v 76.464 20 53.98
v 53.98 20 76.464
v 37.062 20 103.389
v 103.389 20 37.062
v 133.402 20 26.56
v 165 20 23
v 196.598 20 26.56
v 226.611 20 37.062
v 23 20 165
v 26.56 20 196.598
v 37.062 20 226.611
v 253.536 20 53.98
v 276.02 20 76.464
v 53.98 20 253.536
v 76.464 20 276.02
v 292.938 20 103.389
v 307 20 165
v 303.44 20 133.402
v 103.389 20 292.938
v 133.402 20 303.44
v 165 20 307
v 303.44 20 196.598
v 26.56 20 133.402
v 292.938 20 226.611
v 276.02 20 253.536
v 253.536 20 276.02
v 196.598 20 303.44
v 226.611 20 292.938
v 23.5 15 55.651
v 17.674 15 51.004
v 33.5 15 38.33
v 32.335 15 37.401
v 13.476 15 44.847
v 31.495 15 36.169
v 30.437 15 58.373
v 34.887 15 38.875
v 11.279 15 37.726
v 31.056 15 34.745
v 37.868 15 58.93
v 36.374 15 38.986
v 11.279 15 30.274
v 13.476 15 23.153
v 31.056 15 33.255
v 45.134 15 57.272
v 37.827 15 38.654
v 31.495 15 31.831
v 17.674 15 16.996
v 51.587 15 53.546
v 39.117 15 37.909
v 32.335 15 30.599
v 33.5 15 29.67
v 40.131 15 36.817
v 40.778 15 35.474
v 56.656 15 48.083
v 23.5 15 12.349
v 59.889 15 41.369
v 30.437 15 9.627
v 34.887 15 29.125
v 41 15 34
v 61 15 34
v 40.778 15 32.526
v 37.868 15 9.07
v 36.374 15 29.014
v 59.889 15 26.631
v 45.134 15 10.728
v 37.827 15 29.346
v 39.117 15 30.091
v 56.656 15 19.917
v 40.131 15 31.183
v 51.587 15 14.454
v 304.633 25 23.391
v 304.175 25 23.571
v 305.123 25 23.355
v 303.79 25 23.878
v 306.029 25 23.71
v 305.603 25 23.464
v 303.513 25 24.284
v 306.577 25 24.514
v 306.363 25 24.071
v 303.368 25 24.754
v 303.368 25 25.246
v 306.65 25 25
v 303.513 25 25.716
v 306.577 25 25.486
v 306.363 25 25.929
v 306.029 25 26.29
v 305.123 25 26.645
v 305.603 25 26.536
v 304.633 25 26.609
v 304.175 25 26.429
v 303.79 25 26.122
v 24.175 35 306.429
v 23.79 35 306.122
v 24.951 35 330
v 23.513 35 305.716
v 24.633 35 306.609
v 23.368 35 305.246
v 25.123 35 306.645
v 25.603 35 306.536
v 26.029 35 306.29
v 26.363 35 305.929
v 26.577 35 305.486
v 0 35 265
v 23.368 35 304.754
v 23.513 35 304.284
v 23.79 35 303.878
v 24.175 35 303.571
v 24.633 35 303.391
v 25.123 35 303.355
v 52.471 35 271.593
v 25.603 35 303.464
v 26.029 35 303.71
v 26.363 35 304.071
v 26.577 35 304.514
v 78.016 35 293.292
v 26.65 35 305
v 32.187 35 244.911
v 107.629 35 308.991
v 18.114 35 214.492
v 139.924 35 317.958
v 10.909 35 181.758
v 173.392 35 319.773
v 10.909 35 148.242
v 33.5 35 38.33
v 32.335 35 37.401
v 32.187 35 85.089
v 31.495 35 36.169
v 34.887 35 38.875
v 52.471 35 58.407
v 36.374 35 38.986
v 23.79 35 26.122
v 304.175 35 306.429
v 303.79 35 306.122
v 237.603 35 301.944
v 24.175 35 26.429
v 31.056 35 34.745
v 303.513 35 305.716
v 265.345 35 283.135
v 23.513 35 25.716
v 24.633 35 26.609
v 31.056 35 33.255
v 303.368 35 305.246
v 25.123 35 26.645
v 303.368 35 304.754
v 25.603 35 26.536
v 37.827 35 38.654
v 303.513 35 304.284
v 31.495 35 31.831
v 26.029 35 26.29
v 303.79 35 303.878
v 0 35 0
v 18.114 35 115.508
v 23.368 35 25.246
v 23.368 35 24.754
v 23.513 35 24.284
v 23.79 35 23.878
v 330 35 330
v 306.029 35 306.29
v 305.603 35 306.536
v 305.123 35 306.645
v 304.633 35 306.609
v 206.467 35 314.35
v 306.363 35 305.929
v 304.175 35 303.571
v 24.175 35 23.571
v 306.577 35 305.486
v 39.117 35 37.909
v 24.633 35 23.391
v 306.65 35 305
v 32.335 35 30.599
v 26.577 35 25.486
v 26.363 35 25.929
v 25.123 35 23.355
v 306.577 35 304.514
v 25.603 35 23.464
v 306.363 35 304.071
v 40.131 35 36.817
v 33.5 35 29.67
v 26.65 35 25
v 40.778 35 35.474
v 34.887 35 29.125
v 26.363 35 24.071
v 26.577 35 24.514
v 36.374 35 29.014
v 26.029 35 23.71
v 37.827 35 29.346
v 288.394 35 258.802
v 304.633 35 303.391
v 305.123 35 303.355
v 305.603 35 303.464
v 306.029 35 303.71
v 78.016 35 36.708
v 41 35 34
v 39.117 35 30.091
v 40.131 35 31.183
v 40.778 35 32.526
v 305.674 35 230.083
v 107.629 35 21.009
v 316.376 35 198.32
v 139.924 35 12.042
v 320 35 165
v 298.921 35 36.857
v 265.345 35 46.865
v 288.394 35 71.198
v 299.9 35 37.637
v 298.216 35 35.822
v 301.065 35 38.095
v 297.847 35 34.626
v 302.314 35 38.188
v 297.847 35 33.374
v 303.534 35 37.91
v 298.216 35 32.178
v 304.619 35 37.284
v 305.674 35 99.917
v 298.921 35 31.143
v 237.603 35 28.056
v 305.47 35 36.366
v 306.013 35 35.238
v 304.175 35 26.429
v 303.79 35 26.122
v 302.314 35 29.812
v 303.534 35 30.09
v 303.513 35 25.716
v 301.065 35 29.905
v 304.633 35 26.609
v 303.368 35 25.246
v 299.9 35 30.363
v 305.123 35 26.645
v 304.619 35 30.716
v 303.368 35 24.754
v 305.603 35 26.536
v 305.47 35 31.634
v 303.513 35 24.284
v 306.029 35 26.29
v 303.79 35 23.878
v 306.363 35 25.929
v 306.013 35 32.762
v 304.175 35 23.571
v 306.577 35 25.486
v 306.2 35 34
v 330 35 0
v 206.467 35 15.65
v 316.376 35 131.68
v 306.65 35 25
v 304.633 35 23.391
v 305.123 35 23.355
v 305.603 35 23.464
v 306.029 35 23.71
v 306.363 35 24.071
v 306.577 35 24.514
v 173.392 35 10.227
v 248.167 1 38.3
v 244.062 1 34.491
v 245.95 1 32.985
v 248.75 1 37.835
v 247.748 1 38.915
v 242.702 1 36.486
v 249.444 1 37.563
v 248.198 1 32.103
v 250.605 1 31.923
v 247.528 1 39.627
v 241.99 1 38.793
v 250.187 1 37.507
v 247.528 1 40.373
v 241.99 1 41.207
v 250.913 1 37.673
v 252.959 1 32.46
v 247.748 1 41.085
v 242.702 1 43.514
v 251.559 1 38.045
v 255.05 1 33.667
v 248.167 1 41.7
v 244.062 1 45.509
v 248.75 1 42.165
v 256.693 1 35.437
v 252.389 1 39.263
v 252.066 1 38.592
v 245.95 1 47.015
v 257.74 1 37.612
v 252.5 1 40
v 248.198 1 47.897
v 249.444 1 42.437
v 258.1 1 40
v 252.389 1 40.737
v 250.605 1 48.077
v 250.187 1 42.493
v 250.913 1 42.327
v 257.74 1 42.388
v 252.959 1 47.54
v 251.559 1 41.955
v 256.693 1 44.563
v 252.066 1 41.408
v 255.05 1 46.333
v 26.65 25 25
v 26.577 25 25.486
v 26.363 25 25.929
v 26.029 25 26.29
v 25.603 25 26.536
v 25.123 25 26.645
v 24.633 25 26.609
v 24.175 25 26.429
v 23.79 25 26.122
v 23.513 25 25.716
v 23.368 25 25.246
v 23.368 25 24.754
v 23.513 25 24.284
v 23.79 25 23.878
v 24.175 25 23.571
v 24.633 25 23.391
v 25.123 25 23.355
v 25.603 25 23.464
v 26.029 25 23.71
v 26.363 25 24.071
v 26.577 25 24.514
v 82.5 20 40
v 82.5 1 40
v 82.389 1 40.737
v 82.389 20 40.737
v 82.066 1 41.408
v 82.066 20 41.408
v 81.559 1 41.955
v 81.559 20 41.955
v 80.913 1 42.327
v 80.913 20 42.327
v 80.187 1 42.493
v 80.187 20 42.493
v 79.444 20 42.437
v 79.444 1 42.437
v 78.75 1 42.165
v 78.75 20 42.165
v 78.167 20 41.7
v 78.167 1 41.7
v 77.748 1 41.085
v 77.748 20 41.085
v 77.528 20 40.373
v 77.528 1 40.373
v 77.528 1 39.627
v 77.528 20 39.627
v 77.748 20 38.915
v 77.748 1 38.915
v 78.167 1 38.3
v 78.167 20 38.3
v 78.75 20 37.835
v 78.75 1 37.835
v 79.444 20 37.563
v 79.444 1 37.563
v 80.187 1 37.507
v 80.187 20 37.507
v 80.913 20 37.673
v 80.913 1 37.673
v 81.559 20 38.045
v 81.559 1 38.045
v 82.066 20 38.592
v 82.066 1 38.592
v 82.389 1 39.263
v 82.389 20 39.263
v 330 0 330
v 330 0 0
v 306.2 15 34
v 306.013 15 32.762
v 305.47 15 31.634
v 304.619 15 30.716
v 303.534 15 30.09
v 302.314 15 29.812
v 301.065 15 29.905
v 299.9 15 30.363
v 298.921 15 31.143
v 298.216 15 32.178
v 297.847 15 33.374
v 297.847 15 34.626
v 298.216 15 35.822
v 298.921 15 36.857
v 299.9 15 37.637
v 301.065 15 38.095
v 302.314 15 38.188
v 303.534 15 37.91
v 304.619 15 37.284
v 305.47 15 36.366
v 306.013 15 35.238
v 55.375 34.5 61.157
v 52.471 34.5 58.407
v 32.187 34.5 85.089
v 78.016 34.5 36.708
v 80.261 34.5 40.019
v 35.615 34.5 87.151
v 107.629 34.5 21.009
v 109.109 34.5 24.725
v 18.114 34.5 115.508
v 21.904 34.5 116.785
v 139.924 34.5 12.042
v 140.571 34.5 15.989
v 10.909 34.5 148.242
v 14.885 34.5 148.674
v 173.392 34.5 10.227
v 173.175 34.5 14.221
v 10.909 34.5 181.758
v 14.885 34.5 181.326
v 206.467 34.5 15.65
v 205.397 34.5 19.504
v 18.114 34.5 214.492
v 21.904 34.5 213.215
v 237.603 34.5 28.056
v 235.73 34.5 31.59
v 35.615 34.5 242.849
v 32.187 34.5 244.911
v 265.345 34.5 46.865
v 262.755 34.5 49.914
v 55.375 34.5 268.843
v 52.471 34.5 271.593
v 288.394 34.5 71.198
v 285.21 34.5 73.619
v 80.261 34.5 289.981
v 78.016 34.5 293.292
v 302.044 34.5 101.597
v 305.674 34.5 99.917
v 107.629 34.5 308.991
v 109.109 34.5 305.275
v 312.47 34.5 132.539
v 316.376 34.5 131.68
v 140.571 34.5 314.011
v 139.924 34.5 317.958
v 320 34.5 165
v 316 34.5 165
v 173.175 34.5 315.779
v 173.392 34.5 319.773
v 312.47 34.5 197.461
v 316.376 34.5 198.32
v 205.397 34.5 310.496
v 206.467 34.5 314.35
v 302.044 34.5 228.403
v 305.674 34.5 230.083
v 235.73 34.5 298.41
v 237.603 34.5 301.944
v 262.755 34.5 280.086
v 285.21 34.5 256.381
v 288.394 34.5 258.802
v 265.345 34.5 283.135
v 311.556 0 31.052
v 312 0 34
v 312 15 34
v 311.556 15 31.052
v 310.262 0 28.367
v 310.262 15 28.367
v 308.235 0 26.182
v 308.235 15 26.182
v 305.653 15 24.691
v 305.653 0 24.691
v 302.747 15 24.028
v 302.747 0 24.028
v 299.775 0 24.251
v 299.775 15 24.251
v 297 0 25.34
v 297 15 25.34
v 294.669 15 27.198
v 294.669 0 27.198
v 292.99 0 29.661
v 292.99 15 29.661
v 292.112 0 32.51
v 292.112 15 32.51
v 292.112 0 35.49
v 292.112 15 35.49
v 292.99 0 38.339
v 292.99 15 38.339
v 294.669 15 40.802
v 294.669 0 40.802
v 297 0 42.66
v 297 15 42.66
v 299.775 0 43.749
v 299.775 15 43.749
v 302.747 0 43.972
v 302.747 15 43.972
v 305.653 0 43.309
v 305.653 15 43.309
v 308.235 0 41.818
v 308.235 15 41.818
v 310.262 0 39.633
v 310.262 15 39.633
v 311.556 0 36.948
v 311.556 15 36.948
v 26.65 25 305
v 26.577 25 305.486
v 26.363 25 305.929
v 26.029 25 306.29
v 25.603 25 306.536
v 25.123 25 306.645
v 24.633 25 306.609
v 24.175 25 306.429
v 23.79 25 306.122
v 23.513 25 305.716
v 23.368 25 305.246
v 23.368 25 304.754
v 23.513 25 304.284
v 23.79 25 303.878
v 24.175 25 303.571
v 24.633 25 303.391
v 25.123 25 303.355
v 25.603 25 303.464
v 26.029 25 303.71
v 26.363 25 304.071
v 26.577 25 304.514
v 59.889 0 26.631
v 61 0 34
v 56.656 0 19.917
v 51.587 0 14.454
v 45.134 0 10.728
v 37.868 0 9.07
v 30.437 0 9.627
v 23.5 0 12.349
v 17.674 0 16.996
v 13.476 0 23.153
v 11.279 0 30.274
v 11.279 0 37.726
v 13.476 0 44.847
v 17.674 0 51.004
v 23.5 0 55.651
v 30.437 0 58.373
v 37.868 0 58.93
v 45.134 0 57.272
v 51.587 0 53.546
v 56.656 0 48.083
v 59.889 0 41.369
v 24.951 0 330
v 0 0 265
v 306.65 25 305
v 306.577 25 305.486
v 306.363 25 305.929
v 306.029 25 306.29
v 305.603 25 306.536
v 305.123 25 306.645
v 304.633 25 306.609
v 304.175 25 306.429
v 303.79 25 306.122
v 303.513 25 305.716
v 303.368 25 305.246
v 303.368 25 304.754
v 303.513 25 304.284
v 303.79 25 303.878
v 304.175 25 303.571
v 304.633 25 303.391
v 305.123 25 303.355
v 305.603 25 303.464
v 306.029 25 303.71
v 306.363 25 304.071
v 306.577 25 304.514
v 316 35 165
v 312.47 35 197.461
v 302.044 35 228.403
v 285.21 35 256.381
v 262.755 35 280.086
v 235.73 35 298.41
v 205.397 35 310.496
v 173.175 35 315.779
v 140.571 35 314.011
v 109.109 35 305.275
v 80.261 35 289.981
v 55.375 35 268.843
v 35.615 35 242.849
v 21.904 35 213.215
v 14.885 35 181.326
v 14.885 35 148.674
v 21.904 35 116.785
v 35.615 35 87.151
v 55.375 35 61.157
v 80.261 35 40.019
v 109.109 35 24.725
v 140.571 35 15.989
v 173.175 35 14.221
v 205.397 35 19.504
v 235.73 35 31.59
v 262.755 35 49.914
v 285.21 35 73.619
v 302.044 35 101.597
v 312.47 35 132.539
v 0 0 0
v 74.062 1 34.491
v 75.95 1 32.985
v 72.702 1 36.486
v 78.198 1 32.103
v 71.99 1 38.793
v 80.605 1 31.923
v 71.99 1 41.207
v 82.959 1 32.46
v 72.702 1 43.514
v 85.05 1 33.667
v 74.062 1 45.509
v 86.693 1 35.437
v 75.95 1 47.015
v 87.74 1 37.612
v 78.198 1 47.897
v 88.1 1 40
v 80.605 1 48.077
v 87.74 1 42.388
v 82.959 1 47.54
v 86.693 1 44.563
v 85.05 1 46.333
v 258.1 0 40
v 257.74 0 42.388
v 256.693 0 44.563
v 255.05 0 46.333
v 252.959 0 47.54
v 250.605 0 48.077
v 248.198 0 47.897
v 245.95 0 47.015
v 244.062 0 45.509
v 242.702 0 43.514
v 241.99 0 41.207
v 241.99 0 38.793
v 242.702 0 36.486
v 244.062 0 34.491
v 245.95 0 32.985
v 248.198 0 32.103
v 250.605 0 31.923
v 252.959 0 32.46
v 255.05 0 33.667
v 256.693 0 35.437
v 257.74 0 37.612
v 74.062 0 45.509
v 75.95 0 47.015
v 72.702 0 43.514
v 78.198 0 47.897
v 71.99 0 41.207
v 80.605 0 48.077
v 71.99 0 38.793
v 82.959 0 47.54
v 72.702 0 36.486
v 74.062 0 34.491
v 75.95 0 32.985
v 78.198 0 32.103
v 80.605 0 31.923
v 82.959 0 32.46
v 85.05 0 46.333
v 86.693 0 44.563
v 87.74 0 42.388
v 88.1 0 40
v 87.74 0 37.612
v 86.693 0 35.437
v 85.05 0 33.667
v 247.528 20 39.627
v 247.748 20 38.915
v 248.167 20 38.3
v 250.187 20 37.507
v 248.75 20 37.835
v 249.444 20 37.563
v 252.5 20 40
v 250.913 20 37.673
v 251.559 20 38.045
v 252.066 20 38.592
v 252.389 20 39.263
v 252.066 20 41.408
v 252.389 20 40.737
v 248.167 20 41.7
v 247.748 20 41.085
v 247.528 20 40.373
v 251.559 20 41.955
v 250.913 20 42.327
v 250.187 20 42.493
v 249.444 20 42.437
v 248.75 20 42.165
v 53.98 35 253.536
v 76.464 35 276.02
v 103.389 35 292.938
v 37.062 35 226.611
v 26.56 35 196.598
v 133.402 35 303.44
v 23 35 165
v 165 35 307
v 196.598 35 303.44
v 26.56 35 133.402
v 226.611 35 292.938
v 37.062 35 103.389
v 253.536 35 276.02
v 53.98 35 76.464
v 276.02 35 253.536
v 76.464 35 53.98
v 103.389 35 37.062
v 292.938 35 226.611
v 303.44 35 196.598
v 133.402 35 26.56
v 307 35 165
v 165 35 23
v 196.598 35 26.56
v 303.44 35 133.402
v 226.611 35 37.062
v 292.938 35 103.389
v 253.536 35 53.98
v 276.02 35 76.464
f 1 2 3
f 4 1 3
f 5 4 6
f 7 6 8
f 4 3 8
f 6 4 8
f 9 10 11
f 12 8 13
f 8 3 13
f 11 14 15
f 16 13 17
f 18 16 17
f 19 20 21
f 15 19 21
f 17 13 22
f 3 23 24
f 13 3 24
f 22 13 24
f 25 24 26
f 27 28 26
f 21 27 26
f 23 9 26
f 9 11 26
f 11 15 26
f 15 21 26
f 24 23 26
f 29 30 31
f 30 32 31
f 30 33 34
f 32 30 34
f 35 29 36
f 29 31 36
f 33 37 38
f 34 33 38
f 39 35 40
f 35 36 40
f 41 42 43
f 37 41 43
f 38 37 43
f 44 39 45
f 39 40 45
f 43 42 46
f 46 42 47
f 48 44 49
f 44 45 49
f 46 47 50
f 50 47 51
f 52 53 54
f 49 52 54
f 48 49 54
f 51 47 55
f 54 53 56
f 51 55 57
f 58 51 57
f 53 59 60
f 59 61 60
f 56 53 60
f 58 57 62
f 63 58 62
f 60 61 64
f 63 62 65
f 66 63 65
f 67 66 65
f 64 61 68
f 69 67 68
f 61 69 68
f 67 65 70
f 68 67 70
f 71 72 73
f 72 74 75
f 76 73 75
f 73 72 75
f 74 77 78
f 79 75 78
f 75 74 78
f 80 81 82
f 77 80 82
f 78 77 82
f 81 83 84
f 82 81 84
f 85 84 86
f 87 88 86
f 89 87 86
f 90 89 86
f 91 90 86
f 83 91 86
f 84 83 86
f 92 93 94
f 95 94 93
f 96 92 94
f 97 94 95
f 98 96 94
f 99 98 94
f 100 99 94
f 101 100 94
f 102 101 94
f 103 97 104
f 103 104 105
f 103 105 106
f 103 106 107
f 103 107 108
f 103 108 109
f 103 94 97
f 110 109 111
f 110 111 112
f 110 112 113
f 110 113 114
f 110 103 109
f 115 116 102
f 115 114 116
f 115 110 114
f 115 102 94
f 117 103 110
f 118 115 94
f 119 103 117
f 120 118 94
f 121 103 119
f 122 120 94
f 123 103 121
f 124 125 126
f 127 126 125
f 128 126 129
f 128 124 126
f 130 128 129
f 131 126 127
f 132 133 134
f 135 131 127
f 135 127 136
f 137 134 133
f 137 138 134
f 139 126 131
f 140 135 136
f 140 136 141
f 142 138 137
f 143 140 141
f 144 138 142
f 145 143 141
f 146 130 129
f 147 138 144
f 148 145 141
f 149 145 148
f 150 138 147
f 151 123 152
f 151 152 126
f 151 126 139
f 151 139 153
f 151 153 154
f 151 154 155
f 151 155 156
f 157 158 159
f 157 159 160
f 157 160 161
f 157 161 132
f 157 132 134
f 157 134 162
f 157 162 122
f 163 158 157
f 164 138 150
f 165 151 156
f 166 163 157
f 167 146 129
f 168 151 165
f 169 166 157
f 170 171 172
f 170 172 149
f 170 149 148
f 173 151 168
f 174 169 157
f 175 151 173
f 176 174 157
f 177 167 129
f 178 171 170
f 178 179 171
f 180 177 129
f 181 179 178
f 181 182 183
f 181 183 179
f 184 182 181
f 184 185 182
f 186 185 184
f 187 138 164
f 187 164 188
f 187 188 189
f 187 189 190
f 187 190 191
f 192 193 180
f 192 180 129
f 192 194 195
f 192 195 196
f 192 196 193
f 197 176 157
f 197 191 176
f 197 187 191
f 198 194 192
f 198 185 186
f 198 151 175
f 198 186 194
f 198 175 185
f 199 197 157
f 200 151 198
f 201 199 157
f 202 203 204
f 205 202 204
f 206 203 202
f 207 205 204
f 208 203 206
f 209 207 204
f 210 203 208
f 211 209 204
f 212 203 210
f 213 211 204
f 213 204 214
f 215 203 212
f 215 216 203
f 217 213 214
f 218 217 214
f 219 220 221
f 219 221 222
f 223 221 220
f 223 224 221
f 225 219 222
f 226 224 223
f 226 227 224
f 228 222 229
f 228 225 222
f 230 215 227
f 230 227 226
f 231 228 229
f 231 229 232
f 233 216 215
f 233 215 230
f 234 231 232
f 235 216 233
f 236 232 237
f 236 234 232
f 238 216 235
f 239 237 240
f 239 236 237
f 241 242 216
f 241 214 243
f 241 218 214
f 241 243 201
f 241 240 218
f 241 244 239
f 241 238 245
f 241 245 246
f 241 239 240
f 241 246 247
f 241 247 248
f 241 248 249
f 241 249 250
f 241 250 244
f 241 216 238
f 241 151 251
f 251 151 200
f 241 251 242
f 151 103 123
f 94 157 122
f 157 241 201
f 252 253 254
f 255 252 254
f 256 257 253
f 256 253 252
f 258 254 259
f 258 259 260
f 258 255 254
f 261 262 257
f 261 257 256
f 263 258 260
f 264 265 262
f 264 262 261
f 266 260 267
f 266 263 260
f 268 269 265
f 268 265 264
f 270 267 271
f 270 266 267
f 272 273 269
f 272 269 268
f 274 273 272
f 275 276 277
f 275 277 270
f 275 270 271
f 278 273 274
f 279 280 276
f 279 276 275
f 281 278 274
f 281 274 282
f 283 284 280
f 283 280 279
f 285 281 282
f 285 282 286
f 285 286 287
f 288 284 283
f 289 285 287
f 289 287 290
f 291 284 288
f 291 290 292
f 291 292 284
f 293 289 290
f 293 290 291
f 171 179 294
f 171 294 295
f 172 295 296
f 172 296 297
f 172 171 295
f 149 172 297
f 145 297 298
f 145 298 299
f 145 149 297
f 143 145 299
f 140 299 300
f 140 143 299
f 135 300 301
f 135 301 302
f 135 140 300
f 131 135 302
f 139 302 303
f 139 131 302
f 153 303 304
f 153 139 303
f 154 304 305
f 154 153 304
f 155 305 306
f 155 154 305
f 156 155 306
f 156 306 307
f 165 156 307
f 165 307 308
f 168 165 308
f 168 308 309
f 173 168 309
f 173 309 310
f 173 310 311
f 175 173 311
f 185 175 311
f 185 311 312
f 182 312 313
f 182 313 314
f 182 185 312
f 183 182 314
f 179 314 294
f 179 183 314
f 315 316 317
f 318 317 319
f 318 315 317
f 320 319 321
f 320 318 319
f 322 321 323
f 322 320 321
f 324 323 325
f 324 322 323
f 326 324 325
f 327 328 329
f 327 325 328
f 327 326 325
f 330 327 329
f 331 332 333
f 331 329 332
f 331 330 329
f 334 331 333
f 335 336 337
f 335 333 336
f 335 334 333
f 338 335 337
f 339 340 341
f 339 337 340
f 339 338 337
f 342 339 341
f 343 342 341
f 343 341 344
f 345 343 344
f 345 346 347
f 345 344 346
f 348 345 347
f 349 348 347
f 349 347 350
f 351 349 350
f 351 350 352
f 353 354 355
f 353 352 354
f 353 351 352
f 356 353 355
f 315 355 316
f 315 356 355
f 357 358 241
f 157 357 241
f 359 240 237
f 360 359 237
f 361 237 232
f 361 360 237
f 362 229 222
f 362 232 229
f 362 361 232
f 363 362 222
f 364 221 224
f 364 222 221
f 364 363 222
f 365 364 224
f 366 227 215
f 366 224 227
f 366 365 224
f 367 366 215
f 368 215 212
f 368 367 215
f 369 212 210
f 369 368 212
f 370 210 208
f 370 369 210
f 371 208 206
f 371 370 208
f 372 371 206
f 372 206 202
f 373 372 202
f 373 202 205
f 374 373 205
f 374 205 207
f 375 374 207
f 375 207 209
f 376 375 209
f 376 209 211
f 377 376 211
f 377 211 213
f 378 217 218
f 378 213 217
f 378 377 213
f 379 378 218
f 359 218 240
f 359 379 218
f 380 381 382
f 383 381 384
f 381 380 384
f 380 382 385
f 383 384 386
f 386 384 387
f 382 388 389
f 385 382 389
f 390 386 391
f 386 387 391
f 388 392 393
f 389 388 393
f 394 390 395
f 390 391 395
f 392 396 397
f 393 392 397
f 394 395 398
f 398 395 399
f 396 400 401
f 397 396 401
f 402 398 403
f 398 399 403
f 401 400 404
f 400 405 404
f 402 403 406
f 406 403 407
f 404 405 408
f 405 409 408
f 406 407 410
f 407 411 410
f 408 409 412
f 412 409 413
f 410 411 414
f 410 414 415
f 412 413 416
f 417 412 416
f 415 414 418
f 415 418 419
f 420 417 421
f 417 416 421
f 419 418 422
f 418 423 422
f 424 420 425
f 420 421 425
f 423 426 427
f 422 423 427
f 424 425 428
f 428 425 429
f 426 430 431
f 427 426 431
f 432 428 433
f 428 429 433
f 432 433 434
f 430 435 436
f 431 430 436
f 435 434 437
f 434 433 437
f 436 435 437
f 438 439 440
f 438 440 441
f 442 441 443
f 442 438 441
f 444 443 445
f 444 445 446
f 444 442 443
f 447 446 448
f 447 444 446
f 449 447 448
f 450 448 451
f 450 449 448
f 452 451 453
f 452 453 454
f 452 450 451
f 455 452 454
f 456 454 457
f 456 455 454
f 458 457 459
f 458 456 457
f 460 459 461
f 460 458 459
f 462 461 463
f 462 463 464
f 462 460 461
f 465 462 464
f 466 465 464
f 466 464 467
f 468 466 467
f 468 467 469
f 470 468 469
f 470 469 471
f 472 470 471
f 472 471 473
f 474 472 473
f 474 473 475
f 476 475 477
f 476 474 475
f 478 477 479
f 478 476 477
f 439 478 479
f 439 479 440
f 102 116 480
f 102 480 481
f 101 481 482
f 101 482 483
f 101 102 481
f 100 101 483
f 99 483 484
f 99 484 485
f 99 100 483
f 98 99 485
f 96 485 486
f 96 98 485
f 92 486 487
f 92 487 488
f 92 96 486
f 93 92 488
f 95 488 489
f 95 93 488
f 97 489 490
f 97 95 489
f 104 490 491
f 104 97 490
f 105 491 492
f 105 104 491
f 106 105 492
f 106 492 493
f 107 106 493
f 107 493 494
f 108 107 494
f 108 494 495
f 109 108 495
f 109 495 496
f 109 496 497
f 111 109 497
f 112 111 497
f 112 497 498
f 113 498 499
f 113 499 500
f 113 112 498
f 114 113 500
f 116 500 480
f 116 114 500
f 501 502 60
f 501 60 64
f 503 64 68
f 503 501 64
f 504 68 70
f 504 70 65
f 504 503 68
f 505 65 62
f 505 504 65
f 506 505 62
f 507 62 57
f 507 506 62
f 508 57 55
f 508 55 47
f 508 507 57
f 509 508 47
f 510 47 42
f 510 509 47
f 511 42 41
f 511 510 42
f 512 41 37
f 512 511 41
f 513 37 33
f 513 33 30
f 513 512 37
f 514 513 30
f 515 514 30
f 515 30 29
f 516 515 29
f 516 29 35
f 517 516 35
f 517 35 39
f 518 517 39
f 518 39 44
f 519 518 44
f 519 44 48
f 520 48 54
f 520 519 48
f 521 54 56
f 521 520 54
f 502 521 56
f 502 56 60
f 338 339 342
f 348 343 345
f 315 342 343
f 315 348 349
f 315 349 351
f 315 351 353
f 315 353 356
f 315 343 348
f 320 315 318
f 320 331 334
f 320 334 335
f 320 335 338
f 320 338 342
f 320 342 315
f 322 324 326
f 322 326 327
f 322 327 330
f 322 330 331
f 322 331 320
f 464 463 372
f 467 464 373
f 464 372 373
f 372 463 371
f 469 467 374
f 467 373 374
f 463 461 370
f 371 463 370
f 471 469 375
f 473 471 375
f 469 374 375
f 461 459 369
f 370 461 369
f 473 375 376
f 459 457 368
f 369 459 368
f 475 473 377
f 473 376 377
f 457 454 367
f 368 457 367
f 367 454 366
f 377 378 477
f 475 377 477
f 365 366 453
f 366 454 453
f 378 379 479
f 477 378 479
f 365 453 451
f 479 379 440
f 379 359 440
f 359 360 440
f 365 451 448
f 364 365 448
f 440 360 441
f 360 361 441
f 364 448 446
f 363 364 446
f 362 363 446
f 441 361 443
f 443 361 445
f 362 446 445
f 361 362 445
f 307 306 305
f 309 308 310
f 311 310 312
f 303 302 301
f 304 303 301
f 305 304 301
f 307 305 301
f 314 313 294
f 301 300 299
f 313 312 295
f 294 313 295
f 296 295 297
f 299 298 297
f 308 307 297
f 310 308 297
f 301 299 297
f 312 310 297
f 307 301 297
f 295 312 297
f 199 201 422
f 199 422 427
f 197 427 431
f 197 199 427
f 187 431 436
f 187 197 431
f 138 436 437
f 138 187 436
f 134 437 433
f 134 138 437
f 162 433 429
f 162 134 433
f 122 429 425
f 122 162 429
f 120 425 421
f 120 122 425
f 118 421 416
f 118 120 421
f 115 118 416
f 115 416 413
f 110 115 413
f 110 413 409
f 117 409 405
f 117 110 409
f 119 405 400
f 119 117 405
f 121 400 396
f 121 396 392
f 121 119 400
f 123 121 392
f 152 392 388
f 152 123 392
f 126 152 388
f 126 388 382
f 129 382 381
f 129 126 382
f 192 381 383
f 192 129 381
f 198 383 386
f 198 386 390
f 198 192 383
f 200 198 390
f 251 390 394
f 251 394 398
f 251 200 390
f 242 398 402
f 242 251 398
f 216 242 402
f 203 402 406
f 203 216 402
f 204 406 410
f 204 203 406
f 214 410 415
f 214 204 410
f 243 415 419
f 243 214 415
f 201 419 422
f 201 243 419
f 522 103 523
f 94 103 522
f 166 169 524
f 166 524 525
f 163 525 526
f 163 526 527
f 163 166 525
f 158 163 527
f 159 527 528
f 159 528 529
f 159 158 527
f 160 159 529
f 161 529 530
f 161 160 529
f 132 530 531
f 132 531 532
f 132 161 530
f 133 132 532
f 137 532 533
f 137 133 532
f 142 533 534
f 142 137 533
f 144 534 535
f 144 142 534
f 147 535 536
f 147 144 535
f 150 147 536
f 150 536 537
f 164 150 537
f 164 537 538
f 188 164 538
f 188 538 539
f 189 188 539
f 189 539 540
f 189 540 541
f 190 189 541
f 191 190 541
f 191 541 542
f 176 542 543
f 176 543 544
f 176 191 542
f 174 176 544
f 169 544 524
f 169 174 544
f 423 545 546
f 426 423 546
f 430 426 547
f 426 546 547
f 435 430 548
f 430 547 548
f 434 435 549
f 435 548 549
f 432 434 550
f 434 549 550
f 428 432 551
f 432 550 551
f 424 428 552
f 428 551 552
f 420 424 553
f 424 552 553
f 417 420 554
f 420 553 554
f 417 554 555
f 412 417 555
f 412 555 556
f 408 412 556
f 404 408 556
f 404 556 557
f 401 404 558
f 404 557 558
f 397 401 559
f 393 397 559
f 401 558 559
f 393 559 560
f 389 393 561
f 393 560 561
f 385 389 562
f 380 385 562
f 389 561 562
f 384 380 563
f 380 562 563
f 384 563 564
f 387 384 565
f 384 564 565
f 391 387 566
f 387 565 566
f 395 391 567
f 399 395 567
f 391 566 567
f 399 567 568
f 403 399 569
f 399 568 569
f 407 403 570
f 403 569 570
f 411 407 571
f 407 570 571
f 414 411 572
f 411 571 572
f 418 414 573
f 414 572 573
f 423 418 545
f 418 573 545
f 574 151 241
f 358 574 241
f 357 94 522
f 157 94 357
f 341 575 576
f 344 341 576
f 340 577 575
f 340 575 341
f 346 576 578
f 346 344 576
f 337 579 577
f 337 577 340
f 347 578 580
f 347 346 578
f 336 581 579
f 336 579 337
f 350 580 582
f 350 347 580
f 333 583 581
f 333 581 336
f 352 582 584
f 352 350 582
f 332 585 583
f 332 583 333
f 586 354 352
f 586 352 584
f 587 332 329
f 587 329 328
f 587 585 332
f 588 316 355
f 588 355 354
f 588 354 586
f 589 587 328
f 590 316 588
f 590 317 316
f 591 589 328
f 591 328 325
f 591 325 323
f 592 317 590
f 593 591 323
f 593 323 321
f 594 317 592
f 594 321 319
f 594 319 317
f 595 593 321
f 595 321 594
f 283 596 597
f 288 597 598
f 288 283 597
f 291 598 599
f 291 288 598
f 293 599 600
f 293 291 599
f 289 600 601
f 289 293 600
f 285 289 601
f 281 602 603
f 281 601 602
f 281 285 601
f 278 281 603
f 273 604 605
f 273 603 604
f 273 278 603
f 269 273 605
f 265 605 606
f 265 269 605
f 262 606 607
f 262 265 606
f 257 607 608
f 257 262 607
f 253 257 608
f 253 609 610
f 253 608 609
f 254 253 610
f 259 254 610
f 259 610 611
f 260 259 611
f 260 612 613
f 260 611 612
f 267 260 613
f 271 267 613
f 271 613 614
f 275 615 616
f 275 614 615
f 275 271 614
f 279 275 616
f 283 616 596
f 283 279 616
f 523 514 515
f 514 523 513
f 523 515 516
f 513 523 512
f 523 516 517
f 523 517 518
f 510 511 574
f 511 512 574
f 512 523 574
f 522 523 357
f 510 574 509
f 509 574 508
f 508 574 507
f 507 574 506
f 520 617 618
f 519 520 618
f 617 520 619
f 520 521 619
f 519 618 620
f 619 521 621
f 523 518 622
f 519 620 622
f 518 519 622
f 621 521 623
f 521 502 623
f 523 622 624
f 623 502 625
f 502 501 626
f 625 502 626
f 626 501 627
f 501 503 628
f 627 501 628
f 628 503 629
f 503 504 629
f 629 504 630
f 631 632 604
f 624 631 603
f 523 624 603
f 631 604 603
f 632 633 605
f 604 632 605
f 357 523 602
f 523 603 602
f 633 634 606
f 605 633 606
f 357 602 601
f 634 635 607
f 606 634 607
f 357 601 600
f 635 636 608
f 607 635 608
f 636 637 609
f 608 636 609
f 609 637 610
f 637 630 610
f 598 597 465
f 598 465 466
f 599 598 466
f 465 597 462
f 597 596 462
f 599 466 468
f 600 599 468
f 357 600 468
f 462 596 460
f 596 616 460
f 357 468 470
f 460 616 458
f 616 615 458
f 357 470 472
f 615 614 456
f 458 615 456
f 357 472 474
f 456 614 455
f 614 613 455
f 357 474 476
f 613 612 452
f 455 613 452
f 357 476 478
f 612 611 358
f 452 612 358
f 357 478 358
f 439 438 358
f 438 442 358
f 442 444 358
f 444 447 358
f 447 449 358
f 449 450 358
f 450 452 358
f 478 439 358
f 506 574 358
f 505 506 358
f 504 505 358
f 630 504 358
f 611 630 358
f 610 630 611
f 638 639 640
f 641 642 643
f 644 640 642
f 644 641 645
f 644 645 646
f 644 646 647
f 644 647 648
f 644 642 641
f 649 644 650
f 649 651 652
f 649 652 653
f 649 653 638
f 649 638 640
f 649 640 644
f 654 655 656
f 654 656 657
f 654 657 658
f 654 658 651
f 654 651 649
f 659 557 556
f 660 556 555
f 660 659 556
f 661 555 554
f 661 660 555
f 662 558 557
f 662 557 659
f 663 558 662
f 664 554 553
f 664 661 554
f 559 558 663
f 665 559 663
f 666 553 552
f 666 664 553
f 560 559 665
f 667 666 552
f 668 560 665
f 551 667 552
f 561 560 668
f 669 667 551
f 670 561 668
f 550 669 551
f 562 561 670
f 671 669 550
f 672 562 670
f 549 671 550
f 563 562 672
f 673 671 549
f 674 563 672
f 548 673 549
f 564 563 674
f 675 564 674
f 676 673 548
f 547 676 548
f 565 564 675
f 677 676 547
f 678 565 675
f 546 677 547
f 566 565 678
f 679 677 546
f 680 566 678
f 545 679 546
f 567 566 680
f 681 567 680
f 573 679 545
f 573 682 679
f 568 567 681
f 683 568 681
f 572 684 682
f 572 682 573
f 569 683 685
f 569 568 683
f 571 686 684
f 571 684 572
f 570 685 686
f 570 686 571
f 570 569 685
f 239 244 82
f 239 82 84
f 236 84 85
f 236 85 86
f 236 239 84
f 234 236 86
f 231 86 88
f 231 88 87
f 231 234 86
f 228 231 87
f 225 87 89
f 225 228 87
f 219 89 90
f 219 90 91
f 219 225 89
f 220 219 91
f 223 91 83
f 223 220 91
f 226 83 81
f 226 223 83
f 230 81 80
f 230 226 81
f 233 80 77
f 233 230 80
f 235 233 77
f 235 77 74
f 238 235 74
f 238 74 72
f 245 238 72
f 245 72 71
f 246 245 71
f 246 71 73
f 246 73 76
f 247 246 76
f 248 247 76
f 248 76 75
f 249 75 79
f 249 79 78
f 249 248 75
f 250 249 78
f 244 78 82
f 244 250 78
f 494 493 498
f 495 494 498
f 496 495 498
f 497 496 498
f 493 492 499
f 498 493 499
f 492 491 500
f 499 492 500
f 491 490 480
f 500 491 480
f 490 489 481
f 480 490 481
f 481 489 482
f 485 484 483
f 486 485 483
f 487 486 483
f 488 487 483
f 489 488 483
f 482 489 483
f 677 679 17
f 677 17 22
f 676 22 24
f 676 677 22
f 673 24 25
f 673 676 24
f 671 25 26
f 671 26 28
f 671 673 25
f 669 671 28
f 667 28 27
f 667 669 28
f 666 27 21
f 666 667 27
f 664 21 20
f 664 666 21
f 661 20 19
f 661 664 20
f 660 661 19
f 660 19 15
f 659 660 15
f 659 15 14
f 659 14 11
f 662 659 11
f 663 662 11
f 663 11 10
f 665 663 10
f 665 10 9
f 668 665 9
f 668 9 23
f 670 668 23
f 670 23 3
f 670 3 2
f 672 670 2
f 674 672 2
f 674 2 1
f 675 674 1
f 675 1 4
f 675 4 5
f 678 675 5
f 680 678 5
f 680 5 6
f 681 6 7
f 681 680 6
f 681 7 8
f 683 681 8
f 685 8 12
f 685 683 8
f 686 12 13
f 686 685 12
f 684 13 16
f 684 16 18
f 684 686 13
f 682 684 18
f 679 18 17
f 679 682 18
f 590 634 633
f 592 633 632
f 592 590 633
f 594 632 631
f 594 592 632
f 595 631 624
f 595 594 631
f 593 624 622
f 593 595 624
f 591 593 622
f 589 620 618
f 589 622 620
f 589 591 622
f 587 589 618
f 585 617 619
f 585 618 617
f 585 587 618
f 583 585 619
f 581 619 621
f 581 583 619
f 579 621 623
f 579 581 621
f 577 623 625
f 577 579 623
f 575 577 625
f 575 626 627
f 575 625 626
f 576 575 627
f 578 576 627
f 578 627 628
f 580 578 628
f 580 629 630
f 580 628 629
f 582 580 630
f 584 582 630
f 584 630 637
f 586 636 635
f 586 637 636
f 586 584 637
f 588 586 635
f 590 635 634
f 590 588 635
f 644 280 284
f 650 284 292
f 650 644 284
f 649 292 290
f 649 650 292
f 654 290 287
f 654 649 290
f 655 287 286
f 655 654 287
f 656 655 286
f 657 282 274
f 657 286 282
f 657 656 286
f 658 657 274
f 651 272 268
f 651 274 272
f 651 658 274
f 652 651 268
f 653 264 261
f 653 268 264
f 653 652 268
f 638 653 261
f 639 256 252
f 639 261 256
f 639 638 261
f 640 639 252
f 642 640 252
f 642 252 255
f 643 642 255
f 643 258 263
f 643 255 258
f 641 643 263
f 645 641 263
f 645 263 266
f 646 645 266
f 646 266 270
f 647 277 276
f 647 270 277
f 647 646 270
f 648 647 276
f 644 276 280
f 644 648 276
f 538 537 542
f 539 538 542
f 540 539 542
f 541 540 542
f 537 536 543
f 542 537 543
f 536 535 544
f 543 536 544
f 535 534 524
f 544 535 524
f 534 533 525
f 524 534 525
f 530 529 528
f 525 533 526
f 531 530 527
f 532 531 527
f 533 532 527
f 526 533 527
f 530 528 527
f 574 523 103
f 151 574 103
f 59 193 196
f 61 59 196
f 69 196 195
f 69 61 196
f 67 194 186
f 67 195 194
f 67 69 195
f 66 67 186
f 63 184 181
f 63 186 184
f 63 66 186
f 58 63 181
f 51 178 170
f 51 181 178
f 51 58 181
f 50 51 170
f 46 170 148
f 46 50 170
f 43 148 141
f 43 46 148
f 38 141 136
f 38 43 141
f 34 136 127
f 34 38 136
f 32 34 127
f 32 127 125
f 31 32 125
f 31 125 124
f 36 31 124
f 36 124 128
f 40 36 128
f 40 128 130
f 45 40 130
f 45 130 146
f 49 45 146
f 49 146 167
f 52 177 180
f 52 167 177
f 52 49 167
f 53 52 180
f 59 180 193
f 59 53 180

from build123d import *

# Parameters (mm, degrees)
CYLINDER021_R          = 1.65
CYLINDER021_DEPTH      = 10
CYLINDER022_R          = 1.65
CYLINDER022_DEPTH      = 10
CYLINDER023_R          = 1.65
CYLINDER023_DEPTH      = 10
CYLINDER024_R          = 1.65
CYLINDER024_DEPTH      = 10
CYLINDER020_R          = 8.1
CYLINDER020_DEPTH      = 20
CYLINDER019_R          = 8.1
CYLINDER019_DEPTH      = 20
CYLINDER008_R          = 2.5
CYLINDER008_DEPTH      = 20
CYLINDER007_R          = 2.5
CYLINDER007_DEPTH      = 20
CYLINDER006_R          = 142
CYLINDER006_DEPTH      = 180
CYLINDER005_R          = 151
CYLINDER005_DEPTH      = 0.5
CYLINDER004_R          = 155
CYLINDER004_DEPTH      = 0.5
CUT002_PLACEMENT_ANGLE = 90
CYLINDER003_R          = 25
CYLINDER003_DEPTH      = 15
CYLINDER001_R          = 5
CYLINDER001_DEPTH      = 40
CYLINDER_R             = 4.2
CYLINDER_DEPTH         = 40
CYLINDER002_R          = 10
CYLINDER002_DEPTH      = 15
BOX001_W               = 70
BOX001_H               = 35
BOX001_DEPTH           = 50
BOX001_PLACEMENT_ANGLE = 69
BOX_W                  = 330
BOX_H                  = 35
BOX_DEPTH              = 330


with BuildPart() as zylinder021:
    # Cylinder021 → Cylinder021 (new body)
    with BuildSketch(Plane(origin=(25, 35, 25), x_dir=(1, 0, 0), z_dir=(0, -1, 0))):
        Circle(CYLINDER021_R)
    extrude(amount=CYLINDER021_DEPTH)


with BuildPart() as zylinder022:
    # Cylinder022 → Cylinder022 (new body)
    with BuildSketch(Plane(origin=(305, 35, 25), x_dir=(1, 0, 0), z_dir=(0, -1, 0))):
        Circle(CYLINDER022_R)
    extrude(amount=CYLINDER022_DEPTH)


with BuildPart() as zylinder023:
    # Cylinder023 → Cylinder023 (new body)
    with BuildSketch(Plane(origin=(25, 35, 305), x_dir=(1, 0, 0), z_dir=(0, -1, 0))):
        Circle(CYLINDER023_R)
    extrude(amount=CYLINDER023_DEPTH)


with BuildPart() as holeform4copperscrew:
    # Cylinder024 → Cylinder024 (new body)
    with BuildSketch(Plane(origin=(305, 35, 305), x_dir=(1, 0, 0), z_dir=(0, -1, 0))):
        Circle(CYLINDER024_R)
    extrude(amount=CYLINDER024_DEPTH)

    # Fusion006: union Zylinder021, Zylinder022, Zylinder023
    add(zylinder021.part)
    add(zylinder022.part)
    add(zylinder023.part)


with BuildPart() as zylinder020:
    # Cylinder020 → Cylinder020 (new body)
    with BuildSketch(Plane(origin=(80, 1, 40), x_dir=(1, 0, 0), z_dir=(0, -1, 0))):
        Circle(CYLINDER020_R)
    extrude(amount=CYLINDER020_DEPTH)


with BuildPart() as fusion005:
    # Cylinder019 → Cylinder019 (new body)
    with BuildSketch(Plane(origin=(250, 1, 40), x_dir=(1, 0, 0), z_dir=(0, -1, 0))):
        Circle(CYLINDER019_R)
    extrude(amount=CYLINDER019_DEPTH)

    # Fusion005: union Zylinder020
    add(zylinder020.part)


with BuildPart() as zylinder008:
    # Cylinder008 → Cylinder008 (new body)
    with BuildSketch(Plane(origin=(250, 20, 40), x_dir=(1, 0, 0), z_dir=(0, -1, 0))):
        Circle(CYLINDER008_R)
    extrude(amount=CYLINDER008_DEPTH)


with BuildPart() as fusion003:
    # Cylinder007 → Cylinder007 (new body)
    with BuildSketch(Plane(origin=(80, 20, 40), x_dir=(1, 0, 0), z_dir=(0, -1, 0))):
        Circle(CYLINDER007_R)
    extrude(amount=CYLINDER007_DEPTH)

    # Fusion003: union Zylinder008
    add(zylinder008.part)


with BuildPart() as zylinder006:
    # Cylinder006 → Cylinder006 (new body)
    with BuildSketch(Plane(origin=(165, 200, 165), x_dir=(1, 0, 0), z_dir=(0, -1, 0))):
        Circle(CYLINDER006_R)
    extrude(amount=CYLINDER006_DEPTH)


with BuildPart() as zylinder005:
    # Cylinder005 → Cylinder005 (new body)
    with BuildSketch(Plane.XY):
        Circle(CYLINDER005_R)
    extrude(amount=CYLINDER005_DEPTH)


with BuildPart() as cut002:
    # Cylinder004 → Cylinder004 (new body)
    with BuildSketch(Plane.XY):
        Circle(CYLINDER004_R)
    extrude(amount=CYLINDER004_DEPTH)

    # Cut002: cut Zylinder005
    add(zylinder005.part, mode=Mode.SUBTRACT)


with BuildPart() as cut002_1:
    # Cut002 placement: moved
    add(cut002.part.moved(Location((165, 35, 165))).rotate(Axis((165, 35, 165), (1, 0, 0)), CUT002_PLACEMENT_ANGLE))


with BuildPart() as zylinder003:
    # Cylinder003 → Cylinder003 (new body)
    with BuildSketch(Plane(origin=(36, 0, 34), x_dir=(1, 0, 0), z_dir=(0, 1, 0))):
        Circle(CYLINDER003_R)
    extrude(amount=CYLINDER003_DEPTH)


with BuildPart() as fusion001:
    # Cylinder001 → Cylinder001 (new body)
    with BuildSketch(Plane(origin=(36, 0, 34), x_dir=(1, 0, 0), z_dir=(0, 1, 0))):
        Circle(CYLINDER001_R)
    extrude(amount=CYLINDER001_DEPTH)

    # Fusion001: union Zylinder003
    add(zylinder003.part)


with BuildPart() as zylinder:
    # Cylinder → Cylinder (new body)
    with BuildSketch(Plane(origin=(302, 0, 34), x_dir=(1, 0, 0), z_dir=(0, 1, 0))):
        Circle(CYLINDER_R)
    extrude(amount=CYLINDER_DEPTH)


with BuildPart() as fusion002:
    # Cylinder002 → Cylinder002 (new body)
    with BuildSketch(Plane(origin=(302, 0, 34), x_dir=(1, 0, 0), z_dir=(0, 1, 0))):
        Circle(CYLINDER002_R)
    extrude(amount=CYLINDER002_DEPTH)

    # Fusion: union Zylinder
    add(zylinder.part)

    # Fusion002: union Fusion001
    add(fusion001.part)


with BuildPart() as w_rfel001:
    # Box001 → Box001 (new body)
    with BuildSketch(Plane.XY):
        with Locations((35, 17.5)):
            Rectangle(BOX001_W, BOX001_H)
    extrude(amount=BOX001_DEPTH)


with BuildPart() as w_rfel001_1:
    # Box001 placement: moved
    add(w_rfel001.part.moved(Location((0, 0, 265))).rotate(Axis((0, 0, 265), (0, -1, 0)), BOX001_PLACEMENT_ANGLE))


with BuildPart() as simplefrontdoor01:
    # Box → Box (new body)
    with BuildSketch(Plane.XY):
        with Locations((165, 17.5)):
            Rectangle(BOX_W, BOX_H)
    extrude(amount=BOX_DEPTH)

    # Cut: cut Würfel001
    add(w_rfel001_1.part, mode=Mode.SUBTRACT)

    # Cut001: cut Fusion002
    add(fusion002.part, mode=Mode.SUBTRACT)

    # Cut003: cut Cut002
    add(cut002_1.part, mode=Mode.SUBTRACT)

    # Cut004: cut Zylinder006
    add(zylinder006.part, mode=Mode.SUBTRACT)

    # Cut005: cut Fusion003
    add(fusion003.part, mode=Mode.SUBTRACT)

    # Cut011: cut Fusion005
    add(fusion005.part, mode=Mode.SUBTRACT)

    # Cut012: cut HoleForM4CopperScrew
    add(holeform4copperscrew.part, mode=Mode.SUBTRACT)


solid = simplefrontdoor01.part
